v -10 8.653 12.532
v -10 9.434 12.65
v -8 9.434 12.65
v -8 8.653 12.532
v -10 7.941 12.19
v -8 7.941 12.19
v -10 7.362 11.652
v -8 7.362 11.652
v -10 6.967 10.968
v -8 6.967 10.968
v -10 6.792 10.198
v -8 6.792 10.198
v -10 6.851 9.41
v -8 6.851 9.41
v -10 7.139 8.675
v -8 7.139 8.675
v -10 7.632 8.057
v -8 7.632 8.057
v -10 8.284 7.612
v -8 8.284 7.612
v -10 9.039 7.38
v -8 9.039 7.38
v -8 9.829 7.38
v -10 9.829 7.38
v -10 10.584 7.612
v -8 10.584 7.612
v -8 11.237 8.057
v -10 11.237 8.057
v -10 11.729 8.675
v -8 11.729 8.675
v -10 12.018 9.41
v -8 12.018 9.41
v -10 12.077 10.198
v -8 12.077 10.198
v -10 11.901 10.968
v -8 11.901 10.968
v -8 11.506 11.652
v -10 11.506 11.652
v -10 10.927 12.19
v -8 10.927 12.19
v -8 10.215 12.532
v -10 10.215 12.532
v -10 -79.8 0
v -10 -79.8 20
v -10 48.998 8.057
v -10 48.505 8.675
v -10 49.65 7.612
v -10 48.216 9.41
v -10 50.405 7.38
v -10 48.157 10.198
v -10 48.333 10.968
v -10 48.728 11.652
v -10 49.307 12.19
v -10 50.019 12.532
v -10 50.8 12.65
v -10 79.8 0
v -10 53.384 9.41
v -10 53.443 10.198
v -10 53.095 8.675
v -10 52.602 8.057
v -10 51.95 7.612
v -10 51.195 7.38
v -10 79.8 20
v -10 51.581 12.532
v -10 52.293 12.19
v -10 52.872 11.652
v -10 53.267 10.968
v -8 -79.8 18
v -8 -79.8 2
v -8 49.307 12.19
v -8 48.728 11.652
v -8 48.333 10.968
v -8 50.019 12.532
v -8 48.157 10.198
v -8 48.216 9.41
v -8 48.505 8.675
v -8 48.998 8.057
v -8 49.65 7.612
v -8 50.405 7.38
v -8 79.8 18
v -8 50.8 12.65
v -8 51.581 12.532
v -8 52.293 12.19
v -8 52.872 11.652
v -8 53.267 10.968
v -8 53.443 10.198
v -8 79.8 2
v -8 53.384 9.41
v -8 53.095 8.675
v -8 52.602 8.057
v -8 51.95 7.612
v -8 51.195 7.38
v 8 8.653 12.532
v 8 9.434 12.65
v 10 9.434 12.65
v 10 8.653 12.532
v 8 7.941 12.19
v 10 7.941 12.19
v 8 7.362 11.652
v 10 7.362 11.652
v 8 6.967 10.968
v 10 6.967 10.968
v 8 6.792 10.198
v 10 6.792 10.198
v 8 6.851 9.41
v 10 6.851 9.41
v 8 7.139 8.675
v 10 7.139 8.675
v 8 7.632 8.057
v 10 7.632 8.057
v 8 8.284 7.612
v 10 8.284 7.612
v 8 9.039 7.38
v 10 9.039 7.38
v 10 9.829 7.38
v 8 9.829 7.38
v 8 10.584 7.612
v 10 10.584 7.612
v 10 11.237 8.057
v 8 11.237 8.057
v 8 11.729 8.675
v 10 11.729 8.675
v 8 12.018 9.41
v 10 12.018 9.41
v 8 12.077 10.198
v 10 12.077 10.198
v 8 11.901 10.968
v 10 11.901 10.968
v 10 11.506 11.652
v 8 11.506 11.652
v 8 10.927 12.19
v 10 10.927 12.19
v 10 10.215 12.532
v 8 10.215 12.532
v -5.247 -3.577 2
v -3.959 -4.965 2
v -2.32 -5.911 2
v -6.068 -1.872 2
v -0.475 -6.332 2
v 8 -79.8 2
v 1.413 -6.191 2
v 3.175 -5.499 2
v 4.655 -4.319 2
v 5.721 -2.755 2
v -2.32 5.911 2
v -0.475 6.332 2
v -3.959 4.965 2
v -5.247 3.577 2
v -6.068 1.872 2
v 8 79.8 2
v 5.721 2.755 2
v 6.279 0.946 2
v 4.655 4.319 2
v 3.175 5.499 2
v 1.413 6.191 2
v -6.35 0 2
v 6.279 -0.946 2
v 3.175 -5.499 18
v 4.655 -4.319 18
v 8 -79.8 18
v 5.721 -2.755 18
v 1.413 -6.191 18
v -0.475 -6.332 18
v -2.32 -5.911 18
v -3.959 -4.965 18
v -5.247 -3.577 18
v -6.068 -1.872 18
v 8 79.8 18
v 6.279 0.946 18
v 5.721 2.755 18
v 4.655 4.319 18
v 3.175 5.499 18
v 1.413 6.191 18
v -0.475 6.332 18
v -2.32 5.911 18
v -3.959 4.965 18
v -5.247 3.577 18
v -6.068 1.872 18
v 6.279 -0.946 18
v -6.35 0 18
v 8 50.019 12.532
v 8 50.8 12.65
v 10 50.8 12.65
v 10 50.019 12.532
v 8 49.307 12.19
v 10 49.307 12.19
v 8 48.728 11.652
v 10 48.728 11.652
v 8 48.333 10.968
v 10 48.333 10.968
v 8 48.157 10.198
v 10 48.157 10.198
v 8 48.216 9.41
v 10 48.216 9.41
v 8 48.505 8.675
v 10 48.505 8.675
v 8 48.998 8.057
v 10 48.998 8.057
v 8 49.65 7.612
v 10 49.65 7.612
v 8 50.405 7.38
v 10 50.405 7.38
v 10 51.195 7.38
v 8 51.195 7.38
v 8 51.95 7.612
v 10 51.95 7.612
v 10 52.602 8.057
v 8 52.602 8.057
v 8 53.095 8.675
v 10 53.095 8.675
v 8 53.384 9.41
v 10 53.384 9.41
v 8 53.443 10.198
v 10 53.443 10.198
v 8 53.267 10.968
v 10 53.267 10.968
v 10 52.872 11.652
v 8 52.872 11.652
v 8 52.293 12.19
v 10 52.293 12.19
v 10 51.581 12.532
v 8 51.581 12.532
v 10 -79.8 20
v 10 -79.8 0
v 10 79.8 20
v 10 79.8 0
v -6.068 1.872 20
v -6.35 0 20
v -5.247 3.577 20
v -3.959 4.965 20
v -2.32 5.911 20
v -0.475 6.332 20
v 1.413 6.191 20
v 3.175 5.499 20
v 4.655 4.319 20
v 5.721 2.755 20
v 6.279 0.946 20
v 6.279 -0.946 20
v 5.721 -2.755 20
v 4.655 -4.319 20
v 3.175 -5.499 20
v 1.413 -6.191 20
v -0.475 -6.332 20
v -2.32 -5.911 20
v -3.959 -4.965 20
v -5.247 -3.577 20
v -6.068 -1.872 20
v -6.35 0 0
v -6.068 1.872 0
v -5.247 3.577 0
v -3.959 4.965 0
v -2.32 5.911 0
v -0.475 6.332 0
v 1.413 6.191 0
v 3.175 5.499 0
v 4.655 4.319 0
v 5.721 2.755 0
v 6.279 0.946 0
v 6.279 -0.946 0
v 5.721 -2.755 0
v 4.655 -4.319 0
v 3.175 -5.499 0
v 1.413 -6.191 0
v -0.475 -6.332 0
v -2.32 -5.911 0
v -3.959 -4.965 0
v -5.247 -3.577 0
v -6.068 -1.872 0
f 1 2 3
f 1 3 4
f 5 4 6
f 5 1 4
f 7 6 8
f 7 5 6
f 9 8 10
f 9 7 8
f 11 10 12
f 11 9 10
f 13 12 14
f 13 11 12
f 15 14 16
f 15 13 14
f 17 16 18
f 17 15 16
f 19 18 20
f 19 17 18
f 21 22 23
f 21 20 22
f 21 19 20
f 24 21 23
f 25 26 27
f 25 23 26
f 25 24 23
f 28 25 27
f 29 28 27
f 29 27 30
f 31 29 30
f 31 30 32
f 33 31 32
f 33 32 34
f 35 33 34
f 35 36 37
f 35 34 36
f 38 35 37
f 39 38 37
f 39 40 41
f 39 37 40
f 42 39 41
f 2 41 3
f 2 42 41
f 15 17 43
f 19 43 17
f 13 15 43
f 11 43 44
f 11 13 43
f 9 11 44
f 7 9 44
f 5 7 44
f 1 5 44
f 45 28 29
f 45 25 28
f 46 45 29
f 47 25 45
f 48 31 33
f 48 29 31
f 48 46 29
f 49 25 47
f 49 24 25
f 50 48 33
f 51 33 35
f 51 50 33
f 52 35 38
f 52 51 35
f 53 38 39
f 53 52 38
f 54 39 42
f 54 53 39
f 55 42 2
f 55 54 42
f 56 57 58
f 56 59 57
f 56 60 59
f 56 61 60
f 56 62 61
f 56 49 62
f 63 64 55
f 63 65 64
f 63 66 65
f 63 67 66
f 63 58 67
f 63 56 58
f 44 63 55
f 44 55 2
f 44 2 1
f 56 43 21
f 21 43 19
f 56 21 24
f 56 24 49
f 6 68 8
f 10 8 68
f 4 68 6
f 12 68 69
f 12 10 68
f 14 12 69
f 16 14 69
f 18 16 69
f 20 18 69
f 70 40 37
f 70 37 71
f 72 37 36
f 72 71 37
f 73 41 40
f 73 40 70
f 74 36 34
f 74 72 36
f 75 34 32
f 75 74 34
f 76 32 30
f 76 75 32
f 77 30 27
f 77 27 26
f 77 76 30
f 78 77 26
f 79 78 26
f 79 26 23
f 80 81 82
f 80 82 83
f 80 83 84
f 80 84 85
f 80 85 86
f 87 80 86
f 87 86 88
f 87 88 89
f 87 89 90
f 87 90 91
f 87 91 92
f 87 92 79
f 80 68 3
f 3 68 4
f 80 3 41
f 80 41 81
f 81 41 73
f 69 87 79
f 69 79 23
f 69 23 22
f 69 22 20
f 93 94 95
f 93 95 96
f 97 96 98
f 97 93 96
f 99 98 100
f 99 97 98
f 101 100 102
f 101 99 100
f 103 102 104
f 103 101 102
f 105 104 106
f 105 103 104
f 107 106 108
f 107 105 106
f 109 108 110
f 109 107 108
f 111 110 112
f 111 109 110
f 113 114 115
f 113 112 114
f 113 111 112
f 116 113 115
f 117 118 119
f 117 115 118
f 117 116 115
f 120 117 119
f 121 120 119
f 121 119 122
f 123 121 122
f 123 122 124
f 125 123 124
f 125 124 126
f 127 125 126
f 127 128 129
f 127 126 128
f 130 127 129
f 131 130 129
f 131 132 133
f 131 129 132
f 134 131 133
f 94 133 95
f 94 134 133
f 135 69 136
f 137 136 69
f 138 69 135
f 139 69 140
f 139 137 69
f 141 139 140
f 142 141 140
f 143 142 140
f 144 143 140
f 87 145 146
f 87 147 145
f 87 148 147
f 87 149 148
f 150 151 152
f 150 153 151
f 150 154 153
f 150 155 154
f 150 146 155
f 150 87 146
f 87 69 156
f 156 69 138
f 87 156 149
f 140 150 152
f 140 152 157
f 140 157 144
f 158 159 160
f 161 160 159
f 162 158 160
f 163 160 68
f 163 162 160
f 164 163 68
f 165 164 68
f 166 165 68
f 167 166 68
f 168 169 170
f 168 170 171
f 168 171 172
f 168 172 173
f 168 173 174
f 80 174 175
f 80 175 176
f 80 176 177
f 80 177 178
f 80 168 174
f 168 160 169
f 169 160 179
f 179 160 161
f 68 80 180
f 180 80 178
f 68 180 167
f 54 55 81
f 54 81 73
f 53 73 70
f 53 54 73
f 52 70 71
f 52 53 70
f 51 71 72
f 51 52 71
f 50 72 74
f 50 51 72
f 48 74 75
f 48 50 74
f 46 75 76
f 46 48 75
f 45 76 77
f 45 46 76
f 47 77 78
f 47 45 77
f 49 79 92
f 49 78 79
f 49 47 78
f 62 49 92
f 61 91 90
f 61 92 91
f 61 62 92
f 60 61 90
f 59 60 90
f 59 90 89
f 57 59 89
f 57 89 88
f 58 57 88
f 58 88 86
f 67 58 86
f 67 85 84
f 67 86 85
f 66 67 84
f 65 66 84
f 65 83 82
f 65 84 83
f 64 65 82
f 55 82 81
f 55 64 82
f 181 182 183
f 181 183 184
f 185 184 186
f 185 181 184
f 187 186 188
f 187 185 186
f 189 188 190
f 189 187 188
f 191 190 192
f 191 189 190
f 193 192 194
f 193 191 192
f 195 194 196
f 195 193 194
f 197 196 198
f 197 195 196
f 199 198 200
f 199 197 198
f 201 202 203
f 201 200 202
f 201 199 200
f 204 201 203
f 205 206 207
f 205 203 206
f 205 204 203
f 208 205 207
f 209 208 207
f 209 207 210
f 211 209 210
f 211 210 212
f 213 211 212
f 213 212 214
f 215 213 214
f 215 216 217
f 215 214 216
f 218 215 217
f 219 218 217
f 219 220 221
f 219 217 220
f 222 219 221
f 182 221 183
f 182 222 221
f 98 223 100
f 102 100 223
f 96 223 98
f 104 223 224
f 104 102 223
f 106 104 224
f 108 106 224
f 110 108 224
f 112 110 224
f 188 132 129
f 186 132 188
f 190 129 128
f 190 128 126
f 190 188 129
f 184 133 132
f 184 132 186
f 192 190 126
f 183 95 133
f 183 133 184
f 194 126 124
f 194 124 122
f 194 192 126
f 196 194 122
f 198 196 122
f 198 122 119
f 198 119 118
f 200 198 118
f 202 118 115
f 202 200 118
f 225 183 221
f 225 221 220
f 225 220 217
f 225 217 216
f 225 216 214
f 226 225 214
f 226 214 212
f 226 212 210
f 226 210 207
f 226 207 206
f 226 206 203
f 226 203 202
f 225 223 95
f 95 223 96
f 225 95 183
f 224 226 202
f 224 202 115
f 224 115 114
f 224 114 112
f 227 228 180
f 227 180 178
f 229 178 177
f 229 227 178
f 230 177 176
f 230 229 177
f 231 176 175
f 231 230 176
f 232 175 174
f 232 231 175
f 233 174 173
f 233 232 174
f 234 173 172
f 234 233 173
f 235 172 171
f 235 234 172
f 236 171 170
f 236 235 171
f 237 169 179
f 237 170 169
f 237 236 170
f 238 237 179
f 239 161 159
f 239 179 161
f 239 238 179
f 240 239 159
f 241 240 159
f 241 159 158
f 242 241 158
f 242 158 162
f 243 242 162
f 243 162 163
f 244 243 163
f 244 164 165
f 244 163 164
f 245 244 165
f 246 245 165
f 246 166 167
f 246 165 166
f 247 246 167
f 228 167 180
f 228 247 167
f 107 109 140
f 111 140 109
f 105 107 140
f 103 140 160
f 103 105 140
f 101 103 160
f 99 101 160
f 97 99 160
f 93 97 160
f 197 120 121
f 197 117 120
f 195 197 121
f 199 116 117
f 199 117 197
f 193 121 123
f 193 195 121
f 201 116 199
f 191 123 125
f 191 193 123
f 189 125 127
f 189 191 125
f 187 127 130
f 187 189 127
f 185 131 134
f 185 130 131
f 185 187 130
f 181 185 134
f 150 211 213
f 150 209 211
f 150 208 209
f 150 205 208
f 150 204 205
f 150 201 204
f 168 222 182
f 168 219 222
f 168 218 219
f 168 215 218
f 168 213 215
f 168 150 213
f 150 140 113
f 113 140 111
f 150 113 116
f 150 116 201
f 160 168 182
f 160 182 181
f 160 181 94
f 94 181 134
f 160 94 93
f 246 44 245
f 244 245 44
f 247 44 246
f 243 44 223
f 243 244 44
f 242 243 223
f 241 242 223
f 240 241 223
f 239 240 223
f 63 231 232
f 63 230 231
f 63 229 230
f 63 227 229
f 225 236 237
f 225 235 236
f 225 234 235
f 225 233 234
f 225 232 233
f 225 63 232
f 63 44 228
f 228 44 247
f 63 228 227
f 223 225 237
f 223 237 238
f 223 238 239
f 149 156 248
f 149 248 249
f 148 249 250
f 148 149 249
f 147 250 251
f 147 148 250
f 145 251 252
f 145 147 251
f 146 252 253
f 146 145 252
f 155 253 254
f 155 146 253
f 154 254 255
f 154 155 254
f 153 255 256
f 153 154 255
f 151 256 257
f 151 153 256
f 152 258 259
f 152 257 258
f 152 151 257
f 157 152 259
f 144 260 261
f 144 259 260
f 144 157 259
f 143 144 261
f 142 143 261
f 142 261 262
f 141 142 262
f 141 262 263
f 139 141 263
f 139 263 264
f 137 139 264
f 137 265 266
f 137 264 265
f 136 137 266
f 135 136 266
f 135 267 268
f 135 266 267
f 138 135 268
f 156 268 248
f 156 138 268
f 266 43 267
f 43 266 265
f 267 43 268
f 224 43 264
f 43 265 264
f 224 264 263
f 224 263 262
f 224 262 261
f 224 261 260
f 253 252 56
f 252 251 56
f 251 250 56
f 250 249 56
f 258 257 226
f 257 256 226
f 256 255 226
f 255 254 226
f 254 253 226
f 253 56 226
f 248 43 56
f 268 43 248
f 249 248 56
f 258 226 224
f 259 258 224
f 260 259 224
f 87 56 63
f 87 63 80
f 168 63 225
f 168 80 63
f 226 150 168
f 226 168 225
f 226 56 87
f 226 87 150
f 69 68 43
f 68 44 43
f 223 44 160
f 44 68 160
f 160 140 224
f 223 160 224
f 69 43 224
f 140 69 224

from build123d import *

# Parameters (mm, degrees)
SKETCH1_W               = 20
SKETCH1_H               = 159.6
BOSS_EXTRUDE1_DEPTH     = 2
BOSS_EXTRUDE2_DEPTH     = 159.6
CUT_EXTRUDE1_DEPTH      = 83.873638752
CUT_EXTRUDE1_DEPTH_BACK = 83.873638752
SKETCH3_R               = 6.35
CUT_EXTRUDE2_DEPTH      = 85.664278182
CUT_EXTRUDE2_DEPTH_BACK = 85.664278182
SKETCH5_R               = 2.65


with BuildPart() as part:
    # Sketch1 → Boss-Extrude1 (new body)
    with BuildSketch(Plane.XY):
        Rectangle(SKETCH1_W, SKETCH1_H)
    extrude(amount=BOSS_EXTRUDE1_DEPTH)

    # Sketch4 → Boss-Extrude2 (add)
    with BuildSketch(Plane(origin=(0, 79.8, 0), x_dir=(1, 0, 0), z_dir=(0, 1, 0))):
        Polygon((-8, -2), (-10, -2), (-10, -20), (10, -20), (10, -2), (8, -2), (8, -18), (-8, -18), align=None)
    extrude(amount=-BOSS_EXTRUDE2_DEPTH)

    # Sketch3 → Cut-Extrude1 (cut, two sides: drawn at the far end of the back side and taken through both)
    with BuildSketch(Plane(origin=(0, 0, 0), x_dir=(-1, 0, 0), z_dir=(0, 0, -1)).offset(-CUT_EXTRUDE1_DEPTH_BACK)):
        Circle(SKETCH3_R)
    extrude(amount=CUT_EXTRUDE1_DEPTH + CUT_EXTRUDE1_DEPTH_BACK, mode=Mode.SUBTRACT)

    # Sketch5 → Cut-Extrude2 (cut, two sides: drawn at the far end of the back side and taken through both)
    with BuildSketch(Plane(origin=(10, 0, 0), x_dir=(0, 0, -1), z_dir=(1, 0, 0)).offset(-CUT_EXTRUDE2_DEPTH_BACK)):
        with Locations(Location((-10, 50.8, 0), (0, 0, 180))):
            Circle(SKETCH5_R)
        with Locations(Location((-10, 9.434271247, 0), (0, 0, 180))):
            Circle(SKETCH5_R)
    extrude(amount=CUT_EXTRUDE2_DEPTH + CUT_EXTRUDE2_DEPTH_BACK, mode=Mode.SUBTRACT)


solid = part.part
